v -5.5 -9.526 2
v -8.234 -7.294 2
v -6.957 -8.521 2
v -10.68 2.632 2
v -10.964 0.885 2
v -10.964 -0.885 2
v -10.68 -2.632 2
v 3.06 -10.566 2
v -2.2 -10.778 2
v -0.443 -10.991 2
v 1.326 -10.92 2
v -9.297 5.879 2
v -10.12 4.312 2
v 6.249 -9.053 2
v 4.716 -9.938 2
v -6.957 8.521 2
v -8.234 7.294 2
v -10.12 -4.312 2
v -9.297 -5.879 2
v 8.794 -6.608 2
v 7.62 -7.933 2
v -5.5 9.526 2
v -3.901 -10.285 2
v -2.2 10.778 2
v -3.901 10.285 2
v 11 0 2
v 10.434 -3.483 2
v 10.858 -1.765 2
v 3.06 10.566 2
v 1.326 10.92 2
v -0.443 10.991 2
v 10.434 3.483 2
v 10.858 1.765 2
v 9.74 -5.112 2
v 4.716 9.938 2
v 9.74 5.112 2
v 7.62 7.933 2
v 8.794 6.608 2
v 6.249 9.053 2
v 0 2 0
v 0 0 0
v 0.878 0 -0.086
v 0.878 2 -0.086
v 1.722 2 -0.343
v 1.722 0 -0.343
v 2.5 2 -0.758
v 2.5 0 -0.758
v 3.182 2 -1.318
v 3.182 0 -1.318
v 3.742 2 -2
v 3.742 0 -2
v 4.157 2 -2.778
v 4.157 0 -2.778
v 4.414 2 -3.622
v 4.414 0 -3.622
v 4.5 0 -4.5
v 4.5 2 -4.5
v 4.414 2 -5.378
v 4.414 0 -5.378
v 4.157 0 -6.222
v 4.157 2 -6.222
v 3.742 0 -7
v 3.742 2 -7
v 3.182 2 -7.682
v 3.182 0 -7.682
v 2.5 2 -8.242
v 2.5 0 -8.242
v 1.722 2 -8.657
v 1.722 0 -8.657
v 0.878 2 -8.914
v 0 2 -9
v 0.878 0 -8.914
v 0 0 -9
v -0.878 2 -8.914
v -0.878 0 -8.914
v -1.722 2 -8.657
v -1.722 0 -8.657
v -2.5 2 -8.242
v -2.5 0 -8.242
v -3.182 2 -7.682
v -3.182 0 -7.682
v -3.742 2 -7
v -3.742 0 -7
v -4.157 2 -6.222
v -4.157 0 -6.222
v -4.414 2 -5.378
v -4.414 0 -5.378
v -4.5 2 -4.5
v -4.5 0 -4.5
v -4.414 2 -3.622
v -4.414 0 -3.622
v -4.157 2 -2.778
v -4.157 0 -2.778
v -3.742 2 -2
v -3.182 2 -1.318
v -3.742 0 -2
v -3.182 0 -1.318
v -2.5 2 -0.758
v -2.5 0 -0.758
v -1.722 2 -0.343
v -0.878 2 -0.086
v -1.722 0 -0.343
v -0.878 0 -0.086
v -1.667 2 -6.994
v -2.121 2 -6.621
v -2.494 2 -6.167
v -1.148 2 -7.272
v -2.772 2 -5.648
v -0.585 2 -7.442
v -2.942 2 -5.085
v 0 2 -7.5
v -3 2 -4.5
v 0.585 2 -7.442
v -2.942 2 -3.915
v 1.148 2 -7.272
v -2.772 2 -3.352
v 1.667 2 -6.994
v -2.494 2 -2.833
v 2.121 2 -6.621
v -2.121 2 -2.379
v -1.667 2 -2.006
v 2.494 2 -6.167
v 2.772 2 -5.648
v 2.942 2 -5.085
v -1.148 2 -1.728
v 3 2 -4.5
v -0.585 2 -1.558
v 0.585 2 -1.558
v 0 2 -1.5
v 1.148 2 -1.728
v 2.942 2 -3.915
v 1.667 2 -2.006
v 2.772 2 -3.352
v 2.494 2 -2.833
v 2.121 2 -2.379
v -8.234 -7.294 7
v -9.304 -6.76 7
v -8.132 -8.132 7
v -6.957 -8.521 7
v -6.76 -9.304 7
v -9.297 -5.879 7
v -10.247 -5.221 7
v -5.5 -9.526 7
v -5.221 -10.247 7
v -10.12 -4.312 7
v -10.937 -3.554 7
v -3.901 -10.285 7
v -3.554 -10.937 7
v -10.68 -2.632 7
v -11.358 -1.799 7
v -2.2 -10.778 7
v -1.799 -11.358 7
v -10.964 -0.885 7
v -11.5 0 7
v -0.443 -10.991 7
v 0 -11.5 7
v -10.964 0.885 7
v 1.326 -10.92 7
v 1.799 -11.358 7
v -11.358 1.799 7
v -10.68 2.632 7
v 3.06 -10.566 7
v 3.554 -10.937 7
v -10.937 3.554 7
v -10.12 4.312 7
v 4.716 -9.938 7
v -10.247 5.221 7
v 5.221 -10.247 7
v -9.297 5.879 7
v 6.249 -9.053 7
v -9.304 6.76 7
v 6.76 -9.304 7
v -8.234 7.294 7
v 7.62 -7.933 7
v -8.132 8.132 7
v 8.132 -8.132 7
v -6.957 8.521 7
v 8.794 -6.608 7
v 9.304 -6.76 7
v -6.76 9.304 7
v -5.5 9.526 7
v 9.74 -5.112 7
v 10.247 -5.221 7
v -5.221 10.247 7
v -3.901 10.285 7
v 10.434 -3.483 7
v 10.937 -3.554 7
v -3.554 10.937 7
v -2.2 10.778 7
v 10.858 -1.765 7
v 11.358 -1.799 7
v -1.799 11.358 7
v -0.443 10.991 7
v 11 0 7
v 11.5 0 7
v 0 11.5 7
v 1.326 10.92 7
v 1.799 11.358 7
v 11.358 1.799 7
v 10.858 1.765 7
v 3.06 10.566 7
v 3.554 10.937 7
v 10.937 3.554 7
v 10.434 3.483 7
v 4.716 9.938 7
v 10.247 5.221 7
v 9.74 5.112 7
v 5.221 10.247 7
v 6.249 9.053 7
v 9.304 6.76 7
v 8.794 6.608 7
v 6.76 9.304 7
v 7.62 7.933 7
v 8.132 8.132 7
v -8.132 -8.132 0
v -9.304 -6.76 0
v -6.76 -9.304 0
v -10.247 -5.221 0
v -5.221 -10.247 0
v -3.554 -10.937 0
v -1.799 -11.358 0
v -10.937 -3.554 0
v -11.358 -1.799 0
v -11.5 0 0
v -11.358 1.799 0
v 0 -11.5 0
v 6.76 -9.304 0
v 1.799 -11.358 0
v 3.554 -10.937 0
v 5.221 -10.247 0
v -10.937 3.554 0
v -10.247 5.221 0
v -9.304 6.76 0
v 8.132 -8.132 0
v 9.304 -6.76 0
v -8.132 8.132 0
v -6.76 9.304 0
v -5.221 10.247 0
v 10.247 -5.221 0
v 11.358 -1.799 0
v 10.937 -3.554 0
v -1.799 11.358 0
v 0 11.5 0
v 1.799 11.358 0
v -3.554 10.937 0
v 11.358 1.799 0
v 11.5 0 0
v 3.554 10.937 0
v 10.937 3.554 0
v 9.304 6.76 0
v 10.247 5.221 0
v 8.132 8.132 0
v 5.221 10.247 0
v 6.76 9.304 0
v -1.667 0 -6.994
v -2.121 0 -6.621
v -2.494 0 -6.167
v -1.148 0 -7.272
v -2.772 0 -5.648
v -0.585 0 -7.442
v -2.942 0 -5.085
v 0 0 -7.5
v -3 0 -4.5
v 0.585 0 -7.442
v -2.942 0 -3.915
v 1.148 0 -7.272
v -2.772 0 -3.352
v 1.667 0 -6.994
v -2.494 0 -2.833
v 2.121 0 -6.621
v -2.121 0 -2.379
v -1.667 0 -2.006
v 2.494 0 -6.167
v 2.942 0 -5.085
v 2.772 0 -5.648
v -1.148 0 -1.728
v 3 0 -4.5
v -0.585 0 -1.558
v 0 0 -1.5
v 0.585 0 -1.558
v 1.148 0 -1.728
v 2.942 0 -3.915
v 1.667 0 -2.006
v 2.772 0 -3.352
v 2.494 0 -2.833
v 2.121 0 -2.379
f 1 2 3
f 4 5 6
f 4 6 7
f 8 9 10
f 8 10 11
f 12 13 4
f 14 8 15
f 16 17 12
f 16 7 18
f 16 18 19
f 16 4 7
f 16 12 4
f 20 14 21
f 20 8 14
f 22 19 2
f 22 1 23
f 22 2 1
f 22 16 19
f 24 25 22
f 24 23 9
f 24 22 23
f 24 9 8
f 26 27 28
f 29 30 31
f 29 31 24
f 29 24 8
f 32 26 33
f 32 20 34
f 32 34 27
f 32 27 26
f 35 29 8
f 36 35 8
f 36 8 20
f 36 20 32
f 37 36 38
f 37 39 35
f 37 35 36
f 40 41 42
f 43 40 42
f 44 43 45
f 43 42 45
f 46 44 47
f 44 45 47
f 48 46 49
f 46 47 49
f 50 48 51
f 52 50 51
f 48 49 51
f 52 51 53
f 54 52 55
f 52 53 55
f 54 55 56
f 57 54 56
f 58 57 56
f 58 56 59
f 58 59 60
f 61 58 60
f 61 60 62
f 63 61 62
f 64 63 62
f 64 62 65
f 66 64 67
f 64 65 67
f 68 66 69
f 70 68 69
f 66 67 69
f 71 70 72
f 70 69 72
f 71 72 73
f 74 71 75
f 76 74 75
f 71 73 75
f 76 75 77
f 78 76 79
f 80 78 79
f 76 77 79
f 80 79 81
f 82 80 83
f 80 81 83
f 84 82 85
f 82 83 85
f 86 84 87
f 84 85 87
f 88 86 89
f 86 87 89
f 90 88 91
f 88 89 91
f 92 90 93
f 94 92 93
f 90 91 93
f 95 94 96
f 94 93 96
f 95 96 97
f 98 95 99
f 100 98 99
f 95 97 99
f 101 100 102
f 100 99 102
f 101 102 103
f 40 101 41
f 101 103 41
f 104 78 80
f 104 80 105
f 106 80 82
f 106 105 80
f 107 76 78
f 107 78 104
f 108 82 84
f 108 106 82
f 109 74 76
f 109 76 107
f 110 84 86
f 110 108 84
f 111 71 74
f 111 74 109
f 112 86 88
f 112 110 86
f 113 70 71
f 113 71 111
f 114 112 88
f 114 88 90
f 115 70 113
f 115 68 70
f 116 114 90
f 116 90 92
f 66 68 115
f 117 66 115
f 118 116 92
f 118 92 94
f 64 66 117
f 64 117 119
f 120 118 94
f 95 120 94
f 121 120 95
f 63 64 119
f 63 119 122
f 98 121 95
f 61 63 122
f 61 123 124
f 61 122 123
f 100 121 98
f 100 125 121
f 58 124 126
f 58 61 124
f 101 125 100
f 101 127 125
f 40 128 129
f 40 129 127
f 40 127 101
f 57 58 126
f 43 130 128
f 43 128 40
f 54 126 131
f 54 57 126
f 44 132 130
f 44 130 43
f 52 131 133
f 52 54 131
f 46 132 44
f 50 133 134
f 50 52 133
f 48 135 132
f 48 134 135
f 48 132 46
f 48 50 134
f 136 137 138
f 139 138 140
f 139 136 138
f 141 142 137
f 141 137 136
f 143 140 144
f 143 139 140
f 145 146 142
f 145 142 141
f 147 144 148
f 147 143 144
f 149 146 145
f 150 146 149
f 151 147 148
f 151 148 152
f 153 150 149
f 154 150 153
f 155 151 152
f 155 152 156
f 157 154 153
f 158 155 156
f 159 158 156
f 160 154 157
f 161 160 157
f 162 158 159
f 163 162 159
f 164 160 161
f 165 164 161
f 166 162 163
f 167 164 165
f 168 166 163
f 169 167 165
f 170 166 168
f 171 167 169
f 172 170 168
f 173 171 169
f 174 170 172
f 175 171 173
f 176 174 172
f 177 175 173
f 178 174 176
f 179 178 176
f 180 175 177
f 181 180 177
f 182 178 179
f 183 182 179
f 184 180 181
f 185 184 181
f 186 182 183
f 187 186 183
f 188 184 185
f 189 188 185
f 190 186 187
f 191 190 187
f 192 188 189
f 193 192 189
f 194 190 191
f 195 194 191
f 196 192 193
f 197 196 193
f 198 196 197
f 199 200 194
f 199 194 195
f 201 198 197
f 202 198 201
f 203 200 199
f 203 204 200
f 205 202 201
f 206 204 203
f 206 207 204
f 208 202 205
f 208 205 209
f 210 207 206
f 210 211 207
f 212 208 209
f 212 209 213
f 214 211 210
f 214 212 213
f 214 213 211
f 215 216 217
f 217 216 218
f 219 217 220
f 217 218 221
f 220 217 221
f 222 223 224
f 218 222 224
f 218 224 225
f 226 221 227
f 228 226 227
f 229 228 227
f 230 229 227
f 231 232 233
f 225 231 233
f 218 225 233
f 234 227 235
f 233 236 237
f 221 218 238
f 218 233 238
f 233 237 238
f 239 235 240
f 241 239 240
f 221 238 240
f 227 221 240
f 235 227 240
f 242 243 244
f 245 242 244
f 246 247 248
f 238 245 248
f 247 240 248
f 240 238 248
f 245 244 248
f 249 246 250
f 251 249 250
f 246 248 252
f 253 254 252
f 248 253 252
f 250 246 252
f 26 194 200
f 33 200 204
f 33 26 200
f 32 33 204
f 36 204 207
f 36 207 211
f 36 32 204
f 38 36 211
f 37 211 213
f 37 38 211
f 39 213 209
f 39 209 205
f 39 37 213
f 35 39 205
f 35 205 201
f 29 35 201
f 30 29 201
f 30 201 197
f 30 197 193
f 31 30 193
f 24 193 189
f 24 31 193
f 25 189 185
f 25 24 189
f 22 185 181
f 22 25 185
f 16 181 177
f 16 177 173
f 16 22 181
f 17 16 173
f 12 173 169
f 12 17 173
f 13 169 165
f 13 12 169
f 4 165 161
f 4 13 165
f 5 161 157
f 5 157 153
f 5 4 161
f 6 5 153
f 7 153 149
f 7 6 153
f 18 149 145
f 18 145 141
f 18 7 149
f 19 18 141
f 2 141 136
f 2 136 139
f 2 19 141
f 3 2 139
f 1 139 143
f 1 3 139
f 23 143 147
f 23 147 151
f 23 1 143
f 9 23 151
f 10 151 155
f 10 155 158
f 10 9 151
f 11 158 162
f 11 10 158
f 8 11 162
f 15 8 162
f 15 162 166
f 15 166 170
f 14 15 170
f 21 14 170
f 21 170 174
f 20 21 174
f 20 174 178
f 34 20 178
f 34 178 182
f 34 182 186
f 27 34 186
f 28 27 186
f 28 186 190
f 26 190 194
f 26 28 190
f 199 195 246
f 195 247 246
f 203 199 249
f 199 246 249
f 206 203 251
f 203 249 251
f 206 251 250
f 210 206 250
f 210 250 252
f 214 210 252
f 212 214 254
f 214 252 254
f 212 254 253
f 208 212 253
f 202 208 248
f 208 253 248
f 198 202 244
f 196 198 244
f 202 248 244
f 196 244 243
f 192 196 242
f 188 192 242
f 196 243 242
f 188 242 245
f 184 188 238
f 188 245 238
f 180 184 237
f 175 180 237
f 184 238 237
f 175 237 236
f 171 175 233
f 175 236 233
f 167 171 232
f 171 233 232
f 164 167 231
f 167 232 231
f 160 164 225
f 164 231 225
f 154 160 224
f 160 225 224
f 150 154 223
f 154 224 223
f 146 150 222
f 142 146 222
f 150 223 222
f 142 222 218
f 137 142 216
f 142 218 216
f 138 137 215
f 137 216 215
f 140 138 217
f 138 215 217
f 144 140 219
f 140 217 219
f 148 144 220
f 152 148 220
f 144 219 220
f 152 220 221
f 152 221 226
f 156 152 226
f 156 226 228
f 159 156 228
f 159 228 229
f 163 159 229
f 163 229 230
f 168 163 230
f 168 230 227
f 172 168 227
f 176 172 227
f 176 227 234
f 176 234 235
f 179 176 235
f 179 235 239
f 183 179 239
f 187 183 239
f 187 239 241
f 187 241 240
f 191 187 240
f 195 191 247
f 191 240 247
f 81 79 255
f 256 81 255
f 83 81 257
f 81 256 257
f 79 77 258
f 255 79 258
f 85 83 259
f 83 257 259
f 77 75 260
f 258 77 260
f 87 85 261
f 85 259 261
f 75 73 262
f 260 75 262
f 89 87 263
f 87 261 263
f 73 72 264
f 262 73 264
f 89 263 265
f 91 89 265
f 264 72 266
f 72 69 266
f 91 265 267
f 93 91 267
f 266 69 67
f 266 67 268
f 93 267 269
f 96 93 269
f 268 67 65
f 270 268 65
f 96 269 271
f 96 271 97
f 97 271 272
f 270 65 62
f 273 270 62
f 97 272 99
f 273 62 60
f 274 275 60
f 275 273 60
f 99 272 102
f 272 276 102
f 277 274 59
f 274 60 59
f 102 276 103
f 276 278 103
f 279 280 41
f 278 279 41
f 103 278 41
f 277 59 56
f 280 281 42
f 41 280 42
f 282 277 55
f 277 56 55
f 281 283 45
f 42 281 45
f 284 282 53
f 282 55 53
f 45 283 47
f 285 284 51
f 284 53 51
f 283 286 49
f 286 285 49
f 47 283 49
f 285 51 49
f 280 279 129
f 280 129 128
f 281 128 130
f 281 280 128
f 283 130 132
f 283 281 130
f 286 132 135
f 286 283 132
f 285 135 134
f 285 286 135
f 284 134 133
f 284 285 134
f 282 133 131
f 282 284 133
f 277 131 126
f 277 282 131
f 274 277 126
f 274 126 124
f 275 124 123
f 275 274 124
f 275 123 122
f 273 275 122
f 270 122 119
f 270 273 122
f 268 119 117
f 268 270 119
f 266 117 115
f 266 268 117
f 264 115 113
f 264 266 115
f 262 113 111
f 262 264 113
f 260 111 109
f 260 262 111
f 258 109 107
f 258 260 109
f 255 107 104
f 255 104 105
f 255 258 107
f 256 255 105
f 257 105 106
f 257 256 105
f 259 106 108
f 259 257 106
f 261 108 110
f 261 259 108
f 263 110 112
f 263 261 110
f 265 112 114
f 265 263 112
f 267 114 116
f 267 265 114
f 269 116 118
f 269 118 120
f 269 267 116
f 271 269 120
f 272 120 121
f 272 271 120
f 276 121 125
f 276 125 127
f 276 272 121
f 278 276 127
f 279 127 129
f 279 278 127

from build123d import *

# Parameters (mm, degrees)
SKETCH1_R           = 11.5
BOSS_EXTRUDE1_DEPTH = 2
SKETCH2_R           = 11.5
SKETCH2_R_2         = 11
BOSS_EXTRUDE2_DEPTH = 5
SKETCH3_R           = 4.5
SKETCH3_R_2         = 3
BOSS_EXTRUDE3_DEPTH = 2


with BuildPart() as part:
    # Sketch1 → Boss-Extrude1 (new body)
    with BuildSketch(Plane.XY):
        Circle(SKETCH1_R)
    extrude(amount=BOSS_EXTRUDE1_DEPTH)

    # Sketch2 → Boss-Extrude2 (add)
    with BuildSketch(Plane.XY.offset(2)):
        Circle(SKETCH2_R)
        Circle(SKETCH2_R_2, mode=Mode.SUBTRACT)
    extrude(amount=BOSS_EXTRUDE2_DEPTH)


with BuildPart() as body_2:
    # Sketch3 → Boss-Extrude3 (new body)
    with BuildSketch(Plane(origin=(0, 0, 0), x_dir=(1, 0, 0), z_dir=(0, 1, 0))):
        with Locations(Location((0, 4.5, 0), (0, 0, 270))):
            Circle(SKETCH3_R)
        with Locations(Location((0, 4.5, 0), (0, 0, 270))):
            Circle(SKETCH3_R_2, mode=Mode.SUBTRACT)
    extrude(amount=BOSS_EXTRUDE3_DEPTH)


solid = Compound([part.part, body_2.part])
